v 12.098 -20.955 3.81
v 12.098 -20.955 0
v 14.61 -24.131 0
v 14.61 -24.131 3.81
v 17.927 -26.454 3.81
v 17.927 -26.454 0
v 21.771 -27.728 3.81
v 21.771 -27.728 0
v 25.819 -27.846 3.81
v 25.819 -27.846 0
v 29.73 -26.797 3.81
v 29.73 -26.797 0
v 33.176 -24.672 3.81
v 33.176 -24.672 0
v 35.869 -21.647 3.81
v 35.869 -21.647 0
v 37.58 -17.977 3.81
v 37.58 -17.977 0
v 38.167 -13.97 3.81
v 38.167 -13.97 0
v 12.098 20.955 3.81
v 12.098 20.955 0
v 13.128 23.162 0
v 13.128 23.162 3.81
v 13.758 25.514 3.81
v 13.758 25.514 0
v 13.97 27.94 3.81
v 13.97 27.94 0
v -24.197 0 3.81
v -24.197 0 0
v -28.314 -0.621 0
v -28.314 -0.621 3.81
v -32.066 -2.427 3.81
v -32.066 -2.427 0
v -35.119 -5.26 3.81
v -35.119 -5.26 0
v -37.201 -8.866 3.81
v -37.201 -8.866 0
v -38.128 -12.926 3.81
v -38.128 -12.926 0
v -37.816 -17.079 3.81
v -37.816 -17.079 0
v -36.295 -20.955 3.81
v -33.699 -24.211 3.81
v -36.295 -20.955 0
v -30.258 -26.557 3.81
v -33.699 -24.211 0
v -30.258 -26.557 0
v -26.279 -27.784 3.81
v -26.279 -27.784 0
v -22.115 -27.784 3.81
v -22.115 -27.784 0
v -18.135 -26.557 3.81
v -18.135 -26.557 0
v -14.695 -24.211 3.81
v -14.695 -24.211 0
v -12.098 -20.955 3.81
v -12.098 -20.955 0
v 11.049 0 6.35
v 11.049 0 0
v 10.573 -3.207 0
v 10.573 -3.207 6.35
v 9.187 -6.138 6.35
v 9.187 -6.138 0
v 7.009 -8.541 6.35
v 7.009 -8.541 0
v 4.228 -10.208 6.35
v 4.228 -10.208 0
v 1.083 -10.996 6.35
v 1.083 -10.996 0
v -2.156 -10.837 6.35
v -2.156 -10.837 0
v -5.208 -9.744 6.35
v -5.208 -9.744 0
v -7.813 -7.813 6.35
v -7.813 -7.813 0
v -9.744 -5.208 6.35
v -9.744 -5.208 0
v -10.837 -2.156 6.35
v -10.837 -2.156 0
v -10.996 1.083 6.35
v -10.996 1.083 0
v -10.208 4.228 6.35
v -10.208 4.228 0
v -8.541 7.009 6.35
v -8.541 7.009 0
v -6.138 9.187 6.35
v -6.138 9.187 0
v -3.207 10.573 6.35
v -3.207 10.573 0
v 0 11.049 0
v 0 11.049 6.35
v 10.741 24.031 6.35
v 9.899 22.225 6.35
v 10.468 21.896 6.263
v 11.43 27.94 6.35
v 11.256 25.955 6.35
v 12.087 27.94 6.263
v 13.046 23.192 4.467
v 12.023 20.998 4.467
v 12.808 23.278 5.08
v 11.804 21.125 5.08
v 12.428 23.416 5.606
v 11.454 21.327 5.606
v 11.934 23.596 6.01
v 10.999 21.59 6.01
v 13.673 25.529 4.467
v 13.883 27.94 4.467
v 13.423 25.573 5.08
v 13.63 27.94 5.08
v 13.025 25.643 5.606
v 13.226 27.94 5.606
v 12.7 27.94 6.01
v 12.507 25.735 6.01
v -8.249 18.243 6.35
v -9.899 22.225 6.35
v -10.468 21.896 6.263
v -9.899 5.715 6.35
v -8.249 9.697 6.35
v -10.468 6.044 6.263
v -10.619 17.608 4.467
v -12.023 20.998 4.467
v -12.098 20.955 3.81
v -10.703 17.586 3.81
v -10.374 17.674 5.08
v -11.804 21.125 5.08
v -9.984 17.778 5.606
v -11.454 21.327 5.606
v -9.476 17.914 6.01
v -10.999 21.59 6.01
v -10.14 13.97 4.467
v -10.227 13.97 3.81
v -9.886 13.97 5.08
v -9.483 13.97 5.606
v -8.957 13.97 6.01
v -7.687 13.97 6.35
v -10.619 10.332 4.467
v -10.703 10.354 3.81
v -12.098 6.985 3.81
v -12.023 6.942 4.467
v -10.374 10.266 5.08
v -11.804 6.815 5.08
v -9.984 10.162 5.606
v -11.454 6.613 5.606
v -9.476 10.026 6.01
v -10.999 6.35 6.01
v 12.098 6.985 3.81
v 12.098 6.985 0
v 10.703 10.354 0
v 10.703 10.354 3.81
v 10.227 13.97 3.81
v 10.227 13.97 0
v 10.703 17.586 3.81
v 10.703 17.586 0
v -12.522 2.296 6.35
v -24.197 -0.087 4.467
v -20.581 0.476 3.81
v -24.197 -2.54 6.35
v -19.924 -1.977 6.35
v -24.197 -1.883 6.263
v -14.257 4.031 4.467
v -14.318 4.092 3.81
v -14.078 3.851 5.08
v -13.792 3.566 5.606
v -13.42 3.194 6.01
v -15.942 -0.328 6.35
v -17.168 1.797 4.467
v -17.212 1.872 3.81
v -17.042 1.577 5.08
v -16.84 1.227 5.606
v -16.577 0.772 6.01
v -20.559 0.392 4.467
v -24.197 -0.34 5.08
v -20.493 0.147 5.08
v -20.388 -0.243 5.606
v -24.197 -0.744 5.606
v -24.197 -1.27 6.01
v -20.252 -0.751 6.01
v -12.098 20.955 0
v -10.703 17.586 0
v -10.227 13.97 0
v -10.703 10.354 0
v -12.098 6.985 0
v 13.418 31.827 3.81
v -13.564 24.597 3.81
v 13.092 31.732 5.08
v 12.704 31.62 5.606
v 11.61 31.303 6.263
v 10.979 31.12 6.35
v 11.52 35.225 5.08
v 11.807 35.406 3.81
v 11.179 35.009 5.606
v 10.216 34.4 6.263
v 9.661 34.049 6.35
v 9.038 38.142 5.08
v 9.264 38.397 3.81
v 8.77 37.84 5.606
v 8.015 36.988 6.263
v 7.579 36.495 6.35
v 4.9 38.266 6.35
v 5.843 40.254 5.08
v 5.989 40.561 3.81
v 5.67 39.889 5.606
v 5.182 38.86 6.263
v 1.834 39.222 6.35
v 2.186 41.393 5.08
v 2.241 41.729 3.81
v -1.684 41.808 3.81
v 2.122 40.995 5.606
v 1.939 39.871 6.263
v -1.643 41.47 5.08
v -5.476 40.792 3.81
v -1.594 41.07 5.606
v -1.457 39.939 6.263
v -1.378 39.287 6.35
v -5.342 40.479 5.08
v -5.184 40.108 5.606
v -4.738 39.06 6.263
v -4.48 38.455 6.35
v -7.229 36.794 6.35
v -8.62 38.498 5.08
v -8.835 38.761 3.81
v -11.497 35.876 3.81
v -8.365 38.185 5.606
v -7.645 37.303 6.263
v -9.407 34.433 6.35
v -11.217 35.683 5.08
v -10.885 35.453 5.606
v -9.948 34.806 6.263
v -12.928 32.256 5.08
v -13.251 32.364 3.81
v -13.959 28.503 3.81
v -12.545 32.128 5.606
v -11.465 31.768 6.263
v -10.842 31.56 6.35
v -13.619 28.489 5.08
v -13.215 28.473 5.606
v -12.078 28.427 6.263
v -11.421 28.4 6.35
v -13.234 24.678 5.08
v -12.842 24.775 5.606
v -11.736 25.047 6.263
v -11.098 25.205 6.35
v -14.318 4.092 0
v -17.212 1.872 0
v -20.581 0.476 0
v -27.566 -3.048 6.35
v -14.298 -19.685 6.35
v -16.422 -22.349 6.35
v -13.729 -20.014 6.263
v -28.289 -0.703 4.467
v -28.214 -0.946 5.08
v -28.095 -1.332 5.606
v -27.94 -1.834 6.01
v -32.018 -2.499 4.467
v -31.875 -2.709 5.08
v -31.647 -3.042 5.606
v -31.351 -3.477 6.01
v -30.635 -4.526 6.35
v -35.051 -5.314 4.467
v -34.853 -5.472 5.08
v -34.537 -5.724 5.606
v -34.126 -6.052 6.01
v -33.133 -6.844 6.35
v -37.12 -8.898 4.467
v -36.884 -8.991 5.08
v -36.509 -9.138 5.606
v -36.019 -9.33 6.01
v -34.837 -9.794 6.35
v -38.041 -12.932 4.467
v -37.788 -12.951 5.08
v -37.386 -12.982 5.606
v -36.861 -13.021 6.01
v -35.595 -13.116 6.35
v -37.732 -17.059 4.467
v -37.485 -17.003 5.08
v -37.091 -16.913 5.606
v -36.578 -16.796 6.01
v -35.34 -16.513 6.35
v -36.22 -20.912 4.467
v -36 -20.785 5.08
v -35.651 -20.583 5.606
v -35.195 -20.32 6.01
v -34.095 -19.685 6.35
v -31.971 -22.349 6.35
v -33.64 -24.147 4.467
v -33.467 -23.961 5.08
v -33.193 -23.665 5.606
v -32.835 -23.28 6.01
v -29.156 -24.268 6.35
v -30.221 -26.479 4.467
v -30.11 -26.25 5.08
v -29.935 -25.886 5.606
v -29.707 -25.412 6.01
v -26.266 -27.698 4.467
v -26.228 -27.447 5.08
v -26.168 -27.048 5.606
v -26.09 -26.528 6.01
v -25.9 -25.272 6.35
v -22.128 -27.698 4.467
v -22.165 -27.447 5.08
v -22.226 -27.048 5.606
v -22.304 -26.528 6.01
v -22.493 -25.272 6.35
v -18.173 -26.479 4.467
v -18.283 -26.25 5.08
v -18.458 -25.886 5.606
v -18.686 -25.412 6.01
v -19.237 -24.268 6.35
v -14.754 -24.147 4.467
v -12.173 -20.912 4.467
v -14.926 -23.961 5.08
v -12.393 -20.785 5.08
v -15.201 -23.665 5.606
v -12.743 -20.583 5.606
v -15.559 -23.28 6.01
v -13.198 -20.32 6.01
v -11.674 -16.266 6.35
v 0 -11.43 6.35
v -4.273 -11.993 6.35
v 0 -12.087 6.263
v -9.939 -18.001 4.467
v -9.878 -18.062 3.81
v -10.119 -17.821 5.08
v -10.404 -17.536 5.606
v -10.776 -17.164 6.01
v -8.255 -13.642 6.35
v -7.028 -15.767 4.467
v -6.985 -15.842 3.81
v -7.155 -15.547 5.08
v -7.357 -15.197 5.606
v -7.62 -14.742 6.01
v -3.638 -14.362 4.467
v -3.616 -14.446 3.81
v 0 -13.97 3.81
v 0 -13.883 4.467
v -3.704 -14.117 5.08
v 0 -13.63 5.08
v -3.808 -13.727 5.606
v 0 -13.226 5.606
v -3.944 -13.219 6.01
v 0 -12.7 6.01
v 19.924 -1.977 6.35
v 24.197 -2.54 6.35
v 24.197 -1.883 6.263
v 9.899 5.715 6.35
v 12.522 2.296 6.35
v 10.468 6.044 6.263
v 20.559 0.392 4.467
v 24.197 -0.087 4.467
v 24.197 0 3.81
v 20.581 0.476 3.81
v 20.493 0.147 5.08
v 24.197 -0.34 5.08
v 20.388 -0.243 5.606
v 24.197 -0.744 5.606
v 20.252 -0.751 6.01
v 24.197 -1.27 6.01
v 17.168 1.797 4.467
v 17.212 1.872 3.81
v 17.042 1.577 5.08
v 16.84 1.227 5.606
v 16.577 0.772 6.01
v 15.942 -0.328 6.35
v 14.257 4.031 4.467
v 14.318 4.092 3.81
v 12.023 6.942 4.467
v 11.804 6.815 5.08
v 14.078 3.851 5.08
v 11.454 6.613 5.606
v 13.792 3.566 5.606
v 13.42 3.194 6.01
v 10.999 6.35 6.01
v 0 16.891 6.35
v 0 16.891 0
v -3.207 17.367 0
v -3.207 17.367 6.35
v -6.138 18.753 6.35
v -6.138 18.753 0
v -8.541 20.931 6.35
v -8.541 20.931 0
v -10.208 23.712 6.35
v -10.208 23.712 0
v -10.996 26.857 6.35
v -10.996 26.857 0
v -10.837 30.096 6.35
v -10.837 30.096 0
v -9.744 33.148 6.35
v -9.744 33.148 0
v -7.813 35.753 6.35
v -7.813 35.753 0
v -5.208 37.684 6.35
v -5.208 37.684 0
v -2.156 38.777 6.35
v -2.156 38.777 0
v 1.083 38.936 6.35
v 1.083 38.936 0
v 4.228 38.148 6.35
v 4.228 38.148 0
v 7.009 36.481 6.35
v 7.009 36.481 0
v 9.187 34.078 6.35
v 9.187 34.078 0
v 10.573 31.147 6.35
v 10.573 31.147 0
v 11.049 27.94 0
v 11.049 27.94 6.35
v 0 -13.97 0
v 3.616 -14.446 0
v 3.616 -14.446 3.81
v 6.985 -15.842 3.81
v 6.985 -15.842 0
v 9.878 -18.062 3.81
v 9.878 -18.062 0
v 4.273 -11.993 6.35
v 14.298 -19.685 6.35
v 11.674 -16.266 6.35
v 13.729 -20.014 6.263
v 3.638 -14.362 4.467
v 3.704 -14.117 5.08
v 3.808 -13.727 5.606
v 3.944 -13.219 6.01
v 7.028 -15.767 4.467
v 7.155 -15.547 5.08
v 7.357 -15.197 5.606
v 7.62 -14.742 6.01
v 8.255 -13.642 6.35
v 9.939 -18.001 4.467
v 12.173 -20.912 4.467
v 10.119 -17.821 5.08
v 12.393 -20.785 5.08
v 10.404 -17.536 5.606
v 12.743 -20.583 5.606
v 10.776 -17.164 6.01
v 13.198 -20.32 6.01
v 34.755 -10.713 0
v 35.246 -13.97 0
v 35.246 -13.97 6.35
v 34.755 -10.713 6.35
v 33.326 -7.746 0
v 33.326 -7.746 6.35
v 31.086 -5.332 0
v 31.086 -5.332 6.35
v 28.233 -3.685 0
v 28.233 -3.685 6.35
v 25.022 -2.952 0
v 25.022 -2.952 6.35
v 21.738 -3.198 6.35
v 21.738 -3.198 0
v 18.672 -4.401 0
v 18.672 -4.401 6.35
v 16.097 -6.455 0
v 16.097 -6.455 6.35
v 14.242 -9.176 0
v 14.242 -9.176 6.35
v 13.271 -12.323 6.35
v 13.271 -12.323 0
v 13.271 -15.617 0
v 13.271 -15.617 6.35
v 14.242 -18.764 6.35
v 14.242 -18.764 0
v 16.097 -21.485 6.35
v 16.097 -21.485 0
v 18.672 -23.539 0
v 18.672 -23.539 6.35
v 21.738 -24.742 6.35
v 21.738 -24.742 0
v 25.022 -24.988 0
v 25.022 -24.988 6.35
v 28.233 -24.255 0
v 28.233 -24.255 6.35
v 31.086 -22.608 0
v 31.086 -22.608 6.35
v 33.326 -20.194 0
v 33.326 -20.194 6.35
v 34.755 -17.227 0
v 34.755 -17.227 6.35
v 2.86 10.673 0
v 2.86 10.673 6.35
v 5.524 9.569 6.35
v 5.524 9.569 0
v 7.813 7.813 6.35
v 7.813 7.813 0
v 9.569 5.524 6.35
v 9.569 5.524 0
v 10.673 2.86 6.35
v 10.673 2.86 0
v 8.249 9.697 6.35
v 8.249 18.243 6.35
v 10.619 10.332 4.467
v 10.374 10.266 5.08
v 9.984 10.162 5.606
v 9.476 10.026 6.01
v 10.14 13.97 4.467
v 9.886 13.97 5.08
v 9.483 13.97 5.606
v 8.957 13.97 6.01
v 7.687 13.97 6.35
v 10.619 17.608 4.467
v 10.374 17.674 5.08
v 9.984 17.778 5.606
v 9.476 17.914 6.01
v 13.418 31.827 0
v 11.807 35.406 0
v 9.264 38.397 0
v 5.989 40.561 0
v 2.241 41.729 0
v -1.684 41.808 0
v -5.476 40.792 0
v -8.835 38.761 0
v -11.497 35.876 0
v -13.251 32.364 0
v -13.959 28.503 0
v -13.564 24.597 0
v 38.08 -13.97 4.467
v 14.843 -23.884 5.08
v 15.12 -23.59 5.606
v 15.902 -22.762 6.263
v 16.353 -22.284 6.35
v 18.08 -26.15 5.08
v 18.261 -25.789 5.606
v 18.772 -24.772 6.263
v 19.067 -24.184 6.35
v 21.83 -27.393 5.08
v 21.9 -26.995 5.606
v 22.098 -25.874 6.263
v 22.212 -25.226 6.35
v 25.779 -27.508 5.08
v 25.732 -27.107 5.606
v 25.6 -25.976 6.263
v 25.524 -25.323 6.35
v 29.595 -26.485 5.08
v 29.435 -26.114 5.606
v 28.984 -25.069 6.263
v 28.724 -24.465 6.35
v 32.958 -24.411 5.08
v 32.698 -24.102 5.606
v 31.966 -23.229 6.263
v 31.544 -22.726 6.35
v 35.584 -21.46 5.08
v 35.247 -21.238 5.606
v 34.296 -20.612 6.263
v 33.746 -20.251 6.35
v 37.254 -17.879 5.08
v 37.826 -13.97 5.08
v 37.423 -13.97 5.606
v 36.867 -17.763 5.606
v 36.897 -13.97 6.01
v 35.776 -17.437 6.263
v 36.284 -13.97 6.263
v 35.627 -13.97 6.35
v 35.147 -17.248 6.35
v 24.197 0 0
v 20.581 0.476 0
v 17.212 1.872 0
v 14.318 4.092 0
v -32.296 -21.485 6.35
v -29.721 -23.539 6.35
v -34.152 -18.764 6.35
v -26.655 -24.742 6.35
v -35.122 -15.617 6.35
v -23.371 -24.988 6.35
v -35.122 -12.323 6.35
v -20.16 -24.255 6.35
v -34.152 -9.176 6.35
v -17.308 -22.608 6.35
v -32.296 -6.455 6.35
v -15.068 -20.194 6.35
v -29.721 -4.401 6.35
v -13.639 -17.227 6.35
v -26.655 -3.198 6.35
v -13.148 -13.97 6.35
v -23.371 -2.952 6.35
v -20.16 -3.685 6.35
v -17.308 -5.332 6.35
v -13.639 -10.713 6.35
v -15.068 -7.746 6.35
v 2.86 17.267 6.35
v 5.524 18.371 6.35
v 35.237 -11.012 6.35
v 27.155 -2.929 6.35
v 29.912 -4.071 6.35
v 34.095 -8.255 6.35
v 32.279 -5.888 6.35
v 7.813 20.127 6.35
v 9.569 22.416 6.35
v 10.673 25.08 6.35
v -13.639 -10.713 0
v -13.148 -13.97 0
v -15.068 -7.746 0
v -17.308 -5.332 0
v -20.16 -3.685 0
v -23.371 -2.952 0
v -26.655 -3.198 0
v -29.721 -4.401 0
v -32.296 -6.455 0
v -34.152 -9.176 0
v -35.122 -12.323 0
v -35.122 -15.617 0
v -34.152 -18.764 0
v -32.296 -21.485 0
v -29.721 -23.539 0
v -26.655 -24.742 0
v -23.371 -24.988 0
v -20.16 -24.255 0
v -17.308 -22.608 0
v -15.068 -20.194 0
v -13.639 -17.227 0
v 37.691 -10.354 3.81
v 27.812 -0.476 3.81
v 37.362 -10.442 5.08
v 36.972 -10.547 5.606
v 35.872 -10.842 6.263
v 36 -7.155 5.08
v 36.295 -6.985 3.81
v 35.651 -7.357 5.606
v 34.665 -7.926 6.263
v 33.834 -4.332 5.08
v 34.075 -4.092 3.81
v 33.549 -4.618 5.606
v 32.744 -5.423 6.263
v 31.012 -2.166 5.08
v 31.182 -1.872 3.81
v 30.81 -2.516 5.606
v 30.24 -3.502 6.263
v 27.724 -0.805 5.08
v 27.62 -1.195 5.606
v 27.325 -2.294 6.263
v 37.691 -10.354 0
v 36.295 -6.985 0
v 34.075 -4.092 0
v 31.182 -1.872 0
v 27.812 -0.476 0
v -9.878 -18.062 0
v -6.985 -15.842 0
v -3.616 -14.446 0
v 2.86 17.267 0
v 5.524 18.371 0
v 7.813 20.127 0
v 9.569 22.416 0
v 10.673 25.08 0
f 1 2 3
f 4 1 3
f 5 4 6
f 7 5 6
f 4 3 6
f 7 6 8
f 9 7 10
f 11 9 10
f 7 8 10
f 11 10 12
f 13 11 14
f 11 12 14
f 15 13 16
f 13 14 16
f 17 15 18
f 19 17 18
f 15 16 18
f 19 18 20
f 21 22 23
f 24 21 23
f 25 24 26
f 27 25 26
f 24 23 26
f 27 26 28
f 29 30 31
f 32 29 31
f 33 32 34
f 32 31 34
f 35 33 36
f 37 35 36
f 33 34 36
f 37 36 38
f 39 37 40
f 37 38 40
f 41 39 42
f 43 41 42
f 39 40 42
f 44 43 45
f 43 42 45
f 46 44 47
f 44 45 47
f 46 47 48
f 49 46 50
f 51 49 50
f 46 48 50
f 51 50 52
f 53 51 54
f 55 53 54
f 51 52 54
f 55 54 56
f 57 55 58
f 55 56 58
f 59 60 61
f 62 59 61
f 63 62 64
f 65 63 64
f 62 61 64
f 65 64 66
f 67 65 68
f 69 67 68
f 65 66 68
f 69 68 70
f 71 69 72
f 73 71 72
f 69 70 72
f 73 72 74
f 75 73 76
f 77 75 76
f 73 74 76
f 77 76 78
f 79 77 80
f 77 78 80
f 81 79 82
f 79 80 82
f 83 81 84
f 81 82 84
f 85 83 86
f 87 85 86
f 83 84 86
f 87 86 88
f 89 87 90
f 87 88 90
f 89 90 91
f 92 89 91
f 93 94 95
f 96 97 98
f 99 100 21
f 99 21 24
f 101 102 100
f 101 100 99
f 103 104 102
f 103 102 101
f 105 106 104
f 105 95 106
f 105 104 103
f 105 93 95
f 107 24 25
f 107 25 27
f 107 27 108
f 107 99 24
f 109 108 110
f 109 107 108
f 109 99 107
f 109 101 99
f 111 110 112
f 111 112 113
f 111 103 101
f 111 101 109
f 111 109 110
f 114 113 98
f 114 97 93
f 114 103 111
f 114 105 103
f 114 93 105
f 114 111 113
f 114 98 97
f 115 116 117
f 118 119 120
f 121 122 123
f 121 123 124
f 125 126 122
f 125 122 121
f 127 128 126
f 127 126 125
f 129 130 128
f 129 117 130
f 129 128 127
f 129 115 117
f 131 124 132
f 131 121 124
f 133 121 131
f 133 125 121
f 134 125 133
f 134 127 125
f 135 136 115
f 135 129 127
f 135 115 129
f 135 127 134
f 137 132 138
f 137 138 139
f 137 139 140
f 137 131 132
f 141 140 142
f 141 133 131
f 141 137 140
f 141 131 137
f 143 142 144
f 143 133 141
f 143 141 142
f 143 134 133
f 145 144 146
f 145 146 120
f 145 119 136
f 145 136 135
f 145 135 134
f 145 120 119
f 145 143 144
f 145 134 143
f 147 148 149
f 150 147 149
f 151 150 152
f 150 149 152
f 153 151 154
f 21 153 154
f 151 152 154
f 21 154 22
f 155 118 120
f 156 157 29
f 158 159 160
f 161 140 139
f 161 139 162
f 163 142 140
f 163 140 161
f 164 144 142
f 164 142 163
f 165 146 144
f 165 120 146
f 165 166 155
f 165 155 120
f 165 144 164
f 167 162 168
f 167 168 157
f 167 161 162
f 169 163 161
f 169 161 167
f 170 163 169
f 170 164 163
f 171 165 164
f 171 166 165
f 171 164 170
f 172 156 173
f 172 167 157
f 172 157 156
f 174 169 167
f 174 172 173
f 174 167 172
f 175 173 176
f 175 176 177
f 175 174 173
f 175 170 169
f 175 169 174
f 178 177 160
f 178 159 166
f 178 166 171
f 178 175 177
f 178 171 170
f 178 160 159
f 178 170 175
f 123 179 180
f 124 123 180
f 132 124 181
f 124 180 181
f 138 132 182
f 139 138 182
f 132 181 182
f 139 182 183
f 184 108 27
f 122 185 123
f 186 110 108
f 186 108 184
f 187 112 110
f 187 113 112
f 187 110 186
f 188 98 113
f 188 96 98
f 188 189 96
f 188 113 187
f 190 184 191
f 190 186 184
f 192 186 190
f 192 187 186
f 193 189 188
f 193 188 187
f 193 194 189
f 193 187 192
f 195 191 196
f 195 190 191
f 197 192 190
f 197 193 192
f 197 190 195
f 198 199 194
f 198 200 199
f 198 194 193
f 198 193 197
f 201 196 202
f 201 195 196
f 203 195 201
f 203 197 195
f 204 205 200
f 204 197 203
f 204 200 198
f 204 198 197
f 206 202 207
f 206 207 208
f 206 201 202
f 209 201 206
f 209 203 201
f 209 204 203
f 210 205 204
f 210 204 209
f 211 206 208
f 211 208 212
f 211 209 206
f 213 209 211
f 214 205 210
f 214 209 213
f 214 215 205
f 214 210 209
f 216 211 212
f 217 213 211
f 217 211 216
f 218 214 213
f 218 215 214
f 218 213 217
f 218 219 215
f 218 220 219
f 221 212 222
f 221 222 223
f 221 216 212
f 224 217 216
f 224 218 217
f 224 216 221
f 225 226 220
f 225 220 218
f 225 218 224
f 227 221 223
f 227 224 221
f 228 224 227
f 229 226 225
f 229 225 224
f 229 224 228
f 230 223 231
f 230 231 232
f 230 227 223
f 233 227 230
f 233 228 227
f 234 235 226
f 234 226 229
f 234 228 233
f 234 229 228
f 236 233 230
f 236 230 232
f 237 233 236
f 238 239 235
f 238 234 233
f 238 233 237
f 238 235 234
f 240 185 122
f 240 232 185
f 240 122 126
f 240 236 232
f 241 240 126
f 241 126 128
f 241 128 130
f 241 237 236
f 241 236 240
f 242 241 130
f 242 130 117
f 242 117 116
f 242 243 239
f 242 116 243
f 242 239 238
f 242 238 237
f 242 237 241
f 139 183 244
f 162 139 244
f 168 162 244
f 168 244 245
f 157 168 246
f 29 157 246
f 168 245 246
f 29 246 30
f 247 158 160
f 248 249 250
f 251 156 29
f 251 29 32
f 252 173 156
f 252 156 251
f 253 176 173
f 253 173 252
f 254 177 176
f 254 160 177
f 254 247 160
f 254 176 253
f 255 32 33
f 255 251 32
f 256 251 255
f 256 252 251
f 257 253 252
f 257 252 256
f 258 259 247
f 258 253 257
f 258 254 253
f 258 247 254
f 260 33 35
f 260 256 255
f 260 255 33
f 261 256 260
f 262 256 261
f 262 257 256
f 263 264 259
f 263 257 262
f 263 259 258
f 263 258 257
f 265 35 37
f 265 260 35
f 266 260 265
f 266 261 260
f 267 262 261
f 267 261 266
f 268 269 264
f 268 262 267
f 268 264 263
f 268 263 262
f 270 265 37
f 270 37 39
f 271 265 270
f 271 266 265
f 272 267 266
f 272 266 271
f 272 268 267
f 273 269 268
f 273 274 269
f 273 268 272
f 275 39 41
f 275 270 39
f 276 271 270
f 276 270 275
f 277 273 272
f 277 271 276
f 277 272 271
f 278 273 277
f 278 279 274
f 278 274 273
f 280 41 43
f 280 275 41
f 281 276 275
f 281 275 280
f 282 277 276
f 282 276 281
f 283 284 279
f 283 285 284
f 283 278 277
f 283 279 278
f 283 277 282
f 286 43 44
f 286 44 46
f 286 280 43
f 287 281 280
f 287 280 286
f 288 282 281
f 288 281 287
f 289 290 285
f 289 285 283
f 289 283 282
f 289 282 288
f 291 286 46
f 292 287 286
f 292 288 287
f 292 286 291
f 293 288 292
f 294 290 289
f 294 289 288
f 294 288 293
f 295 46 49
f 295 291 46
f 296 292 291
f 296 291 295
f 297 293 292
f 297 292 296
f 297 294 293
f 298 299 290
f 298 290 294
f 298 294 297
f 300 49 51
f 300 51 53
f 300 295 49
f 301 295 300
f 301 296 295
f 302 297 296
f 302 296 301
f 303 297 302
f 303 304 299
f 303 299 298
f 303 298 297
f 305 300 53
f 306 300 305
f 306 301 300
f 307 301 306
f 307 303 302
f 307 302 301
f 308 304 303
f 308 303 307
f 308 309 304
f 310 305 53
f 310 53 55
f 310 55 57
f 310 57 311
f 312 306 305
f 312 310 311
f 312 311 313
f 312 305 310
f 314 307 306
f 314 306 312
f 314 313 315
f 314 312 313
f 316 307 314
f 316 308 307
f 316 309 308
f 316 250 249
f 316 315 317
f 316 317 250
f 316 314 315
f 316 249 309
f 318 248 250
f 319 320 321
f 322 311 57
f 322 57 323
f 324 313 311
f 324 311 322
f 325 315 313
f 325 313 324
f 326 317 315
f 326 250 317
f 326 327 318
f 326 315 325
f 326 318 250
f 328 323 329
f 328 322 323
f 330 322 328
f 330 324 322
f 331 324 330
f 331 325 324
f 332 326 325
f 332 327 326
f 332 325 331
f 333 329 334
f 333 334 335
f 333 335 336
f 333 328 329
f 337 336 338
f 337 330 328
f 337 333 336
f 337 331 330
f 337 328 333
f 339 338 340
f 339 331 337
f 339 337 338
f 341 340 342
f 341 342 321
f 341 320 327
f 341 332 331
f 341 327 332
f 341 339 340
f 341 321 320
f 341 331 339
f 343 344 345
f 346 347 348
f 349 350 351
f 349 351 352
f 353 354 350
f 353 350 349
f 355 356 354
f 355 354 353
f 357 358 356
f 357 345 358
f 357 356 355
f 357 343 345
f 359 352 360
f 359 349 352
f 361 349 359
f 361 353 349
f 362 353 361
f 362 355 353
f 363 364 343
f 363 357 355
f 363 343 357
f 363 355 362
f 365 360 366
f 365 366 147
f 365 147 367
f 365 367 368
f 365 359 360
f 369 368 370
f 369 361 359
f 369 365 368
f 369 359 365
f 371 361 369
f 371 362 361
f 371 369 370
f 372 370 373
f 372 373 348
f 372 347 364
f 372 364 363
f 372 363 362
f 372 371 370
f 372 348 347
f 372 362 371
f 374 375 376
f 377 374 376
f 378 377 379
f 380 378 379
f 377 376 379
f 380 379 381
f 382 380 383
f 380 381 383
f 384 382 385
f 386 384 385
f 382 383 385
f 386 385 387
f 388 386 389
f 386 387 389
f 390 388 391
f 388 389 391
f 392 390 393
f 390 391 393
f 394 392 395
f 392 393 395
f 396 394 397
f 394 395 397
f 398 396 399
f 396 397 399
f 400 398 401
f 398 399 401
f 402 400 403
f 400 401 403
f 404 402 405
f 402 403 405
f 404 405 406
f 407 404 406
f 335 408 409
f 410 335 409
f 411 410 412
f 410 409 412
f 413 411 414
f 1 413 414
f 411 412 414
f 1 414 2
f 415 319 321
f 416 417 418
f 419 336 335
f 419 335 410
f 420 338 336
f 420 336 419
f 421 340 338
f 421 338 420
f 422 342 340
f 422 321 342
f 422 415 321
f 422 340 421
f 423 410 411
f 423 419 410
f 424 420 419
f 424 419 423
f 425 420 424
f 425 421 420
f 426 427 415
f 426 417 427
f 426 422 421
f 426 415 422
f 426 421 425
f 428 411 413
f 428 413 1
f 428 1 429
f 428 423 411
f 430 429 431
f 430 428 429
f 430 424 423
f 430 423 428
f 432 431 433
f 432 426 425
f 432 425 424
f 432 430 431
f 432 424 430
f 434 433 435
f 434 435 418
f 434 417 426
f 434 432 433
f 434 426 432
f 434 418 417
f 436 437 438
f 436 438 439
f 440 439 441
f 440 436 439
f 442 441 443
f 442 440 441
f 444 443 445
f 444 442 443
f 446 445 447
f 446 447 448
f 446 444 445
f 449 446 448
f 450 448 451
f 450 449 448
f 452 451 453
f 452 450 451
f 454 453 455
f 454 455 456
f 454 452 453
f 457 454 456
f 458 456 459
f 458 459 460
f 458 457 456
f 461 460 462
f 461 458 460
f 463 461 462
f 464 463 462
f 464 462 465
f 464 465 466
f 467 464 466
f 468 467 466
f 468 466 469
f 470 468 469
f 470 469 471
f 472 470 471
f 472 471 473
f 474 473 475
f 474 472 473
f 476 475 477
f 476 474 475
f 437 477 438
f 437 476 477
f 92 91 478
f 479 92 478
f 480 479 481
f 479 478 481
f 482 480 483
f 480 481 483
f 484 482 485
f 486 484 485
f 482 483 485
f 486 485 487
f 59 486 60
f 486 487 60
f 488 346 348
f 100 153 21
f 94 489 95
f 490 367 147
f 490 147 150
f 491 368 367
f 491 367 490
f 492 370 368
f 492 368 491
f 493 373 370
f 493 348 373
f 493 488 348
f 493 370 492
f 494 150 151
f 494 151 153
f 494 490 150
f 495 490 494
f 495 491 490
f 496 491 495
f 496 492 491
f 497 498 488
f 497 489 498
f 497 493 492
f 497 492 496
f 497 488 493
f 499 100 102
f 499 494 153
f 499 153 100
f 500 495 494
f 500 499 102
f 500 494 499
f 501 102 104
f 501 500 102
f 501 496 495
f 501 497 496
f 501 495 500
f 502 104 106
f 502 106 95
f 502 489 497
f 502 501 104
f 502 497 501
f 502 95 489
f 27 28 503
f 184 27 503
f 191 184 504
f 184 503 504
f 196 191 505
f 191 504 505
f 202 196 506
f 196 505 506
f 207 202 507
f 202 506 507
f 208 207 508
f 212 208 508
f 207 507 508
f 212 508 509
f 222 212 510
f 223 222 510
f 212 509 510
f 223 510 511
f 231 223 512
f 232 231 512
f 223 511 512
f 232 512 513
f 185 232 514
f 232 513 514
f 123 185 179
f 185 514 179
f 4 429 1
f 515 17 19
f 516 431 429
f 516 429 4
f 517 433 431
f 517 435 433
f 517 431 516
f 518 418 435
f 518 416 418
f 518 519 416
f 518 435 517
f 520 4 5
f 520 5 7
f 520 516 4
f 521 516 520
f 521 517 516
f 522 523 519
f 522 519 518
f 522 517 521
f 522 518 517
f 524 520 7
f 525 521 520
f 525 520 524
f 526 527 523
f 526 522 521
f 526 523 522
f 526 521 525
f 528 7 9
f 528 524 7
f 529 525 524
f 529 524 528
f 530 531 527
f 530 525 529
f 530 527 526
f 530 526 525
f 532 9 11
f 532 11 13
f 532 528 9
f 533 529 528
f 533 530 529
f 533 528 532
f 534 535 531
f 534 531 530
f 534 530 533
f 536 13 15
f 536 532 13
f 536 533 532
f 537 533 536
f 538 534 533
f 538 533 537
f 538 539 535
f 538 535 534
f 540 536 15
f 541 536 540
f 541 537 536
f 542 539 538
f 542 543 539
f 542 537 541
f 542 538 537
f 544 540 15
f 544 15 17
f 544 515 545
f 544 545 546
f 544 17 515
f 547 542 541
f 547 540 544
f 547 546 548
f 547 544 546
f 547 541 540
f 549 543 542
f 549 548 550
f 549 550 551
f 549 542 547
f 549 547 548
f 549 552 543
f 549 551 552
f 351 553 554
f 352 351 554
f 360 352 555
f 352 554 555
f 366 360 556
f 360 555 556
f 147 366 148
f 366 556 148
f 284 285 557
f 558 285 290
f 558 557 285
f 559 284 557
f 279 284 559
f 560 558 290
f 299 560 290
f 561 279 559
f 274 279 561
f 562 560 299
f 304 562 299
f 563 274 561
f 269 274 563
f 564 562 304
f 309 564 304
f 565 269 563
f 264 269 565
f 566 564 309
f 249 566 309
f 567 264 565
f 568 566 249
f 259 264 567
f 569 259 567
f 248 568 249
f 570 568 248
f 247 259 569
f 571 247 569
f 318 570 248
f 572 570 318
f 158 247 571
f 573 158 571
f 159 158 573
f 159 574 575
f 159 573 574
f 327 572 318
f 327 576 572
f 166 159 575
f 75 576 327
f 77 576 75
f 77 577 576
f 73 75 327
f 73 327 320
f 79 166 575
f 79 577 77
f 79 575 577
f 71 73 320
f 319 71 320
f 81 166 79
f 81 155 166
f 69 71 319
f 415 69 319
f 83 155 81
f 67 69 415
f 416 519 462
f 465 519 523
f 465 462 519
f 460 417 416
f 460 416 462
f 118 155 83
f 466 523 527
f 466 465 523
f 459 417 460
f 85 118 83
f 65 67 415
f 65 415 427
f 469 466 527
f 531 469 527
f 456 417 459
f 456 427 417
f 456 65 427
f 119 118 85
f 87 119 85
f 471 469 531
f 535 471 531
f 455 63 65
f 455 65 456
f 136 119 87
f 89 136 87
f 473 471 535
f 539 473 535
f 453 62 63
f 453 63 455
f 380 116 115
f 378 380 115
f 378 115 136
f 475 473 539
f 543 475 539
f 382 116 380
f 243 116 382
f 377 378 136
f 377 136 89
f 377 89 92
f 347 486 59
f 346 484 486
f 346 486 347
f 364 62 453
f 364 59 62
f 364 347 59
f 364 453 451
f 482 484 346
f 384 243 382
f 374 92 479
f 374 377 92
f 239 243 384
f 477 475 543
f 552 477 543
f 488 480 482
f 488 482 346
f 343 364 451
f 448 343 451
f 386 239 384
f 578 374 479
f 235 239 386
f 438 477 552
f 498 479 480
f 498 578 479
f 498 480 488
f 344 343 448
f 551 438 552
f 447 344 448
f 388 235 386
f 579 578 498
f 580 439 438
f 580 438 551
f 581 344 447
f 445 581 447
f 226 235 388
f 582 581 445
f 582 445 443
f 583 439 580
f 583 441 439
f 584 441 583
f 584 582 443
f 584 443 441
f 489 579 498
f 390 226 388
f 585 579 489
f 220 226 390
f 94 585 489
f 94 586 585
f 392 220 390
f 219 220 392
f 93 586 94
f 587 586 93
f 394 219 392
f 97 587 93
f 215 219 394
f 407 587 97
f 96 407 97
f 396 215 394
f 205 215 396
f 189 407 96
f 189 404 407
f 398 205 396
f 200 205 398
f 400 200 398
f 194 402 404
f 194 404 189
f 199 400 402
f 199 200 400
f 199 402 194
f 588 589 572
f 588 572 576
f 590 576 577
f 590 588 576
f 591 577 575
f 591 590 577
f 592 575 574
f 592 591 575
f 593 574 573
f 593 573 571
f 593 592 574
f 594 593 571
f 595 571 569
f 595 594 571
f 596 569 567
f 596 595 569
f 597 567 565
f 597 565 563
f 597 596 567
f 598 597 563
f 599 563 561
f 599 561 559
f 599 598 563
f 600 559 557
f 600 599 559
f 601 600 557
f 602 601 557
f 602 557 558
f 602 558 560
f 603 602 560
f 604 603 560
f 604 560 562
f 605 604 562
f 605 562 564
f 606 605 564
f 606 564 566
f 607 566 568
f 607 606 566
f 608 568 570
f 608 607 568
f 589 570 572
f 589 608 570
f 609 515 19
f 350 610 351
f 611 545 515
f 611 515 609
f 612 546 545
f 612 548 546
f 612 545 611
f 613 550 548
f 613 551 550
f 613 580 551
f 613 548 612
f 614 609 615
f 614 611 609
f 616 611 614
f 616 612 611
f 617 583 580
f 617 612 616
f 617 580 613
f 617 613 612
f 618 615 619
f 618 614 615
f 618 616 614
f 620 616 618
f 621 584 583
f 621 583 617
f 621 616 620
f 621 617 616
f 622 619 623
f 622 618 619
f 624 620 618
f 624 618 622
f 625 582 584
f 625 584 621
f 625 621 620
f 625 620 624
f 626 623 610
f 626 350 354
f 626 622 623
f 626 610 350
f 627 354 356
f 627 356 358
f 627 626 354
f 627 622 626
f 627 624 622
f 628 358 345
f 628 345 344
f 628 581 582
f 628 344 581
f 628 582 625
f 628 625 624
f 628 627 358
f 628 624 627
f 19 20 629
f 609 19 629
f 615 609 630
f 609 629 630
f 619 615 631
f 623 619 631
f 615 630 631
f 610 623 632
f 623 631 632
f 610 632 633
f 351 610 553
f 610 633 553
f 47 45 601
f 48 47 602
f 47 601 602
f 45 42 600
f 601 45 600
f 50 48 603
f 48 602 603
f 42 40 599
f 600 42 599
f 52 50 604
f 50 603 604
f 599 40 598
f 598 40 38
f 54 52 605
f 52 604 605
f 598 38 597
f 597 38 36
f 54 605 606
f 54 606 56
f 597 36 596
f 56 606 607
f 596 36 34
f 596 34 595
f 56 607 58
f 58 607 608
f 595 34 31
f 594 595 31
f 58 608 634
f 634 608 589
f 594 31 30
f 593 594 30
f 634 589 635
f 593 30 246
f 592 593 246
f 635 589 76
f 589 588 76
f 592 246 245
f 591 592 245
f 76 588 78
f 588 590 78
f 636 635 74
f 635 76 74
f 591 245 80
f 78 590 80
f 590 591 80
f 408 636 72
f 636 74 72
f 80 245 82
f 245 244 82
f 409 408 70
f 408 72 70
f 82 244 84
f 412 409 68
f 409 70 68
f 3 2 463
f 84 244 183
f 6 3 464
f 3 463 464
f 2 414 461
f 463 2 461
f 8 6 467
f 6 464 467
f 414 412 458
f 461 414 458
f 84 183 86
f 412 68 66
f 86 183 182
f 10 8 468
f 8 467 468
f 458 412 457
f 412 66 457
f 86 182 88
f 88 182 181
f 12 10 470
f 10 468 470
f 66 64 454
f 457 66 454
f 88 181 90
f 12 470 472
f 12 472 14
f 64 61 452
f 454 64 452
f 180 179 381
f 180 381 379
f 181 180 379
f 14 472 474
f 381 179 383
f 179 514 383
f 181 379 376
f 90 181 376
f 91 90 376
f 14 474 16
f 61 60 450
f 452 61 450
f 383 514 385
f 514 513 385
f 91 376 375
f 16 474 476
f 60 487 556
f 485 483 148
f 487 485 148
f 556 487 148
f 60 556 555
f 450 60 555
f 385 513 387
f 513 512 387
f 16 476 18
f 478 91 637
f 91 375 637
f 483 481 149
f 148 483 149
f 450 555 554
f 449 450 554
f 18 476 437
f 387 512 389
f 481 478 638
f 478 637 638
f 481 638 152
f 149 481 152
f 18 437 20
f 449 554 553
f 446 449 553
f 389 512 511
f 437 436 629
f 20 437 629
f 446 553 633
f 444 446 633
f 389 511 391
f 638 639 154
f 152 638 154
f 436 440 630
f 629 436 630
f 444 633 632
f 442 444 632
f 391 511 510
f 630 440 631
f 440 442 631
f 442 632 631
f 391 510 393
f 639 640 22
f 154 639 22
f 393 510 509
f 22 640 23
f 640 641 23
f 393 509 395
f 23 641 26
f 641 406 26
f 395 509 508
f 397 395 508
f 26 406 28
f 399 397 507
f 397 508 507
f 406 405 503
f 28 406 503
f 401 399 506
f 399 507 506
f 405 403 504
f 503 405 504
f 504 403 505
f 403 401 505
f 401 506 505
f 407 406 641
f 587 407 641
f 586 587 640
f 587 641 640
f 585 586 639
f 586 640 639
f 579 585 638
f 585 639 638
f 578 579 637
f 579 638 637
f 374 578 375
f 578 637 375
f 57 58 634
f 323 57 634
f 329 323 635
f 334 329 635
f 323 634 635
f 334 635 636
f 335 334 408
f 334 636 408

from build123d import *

# Parameters (mm, degrees)
F0_R     = 11.049
F1_DEPTH = 6.35
F2_R     = 2.54


# Not quite as in the source:
# - ends of sketch curves that miss each other by under 0.0002 mm in the source are joined


with BuildPart() as f1:
    # F0 (on Top) → F1 (new body)
    with BuildSketch(Plane.XY):
        with BuildLine():
            ThreePointArc((0, 11.049), (7.8128228253, 7.8128228253), (11.049, 0))
            ThreePointArc((11.049, 0), (-2.8596916293, -10.6725144547), (-9.5687146864, 5.5245))
            Line((-9.5687146864, 5.5245), (-12.0983748909, 6.985))
            ThreePointArc((-12.0983748909, 6.985), (-13.97, 3.443e-07), (-12.0983754224, -6.9849990793))
            ThreePointArc((-12.0983754224, -6.9849990793), (-6.9850004566, -12.0983746273), (8.7e-09, -13.97))
            ThreePointArc((8.7e-09, -13.97), (6.9850004798, -12.0983746139), (12.0983754405, -6.984999048))
            ThreePointArc((12.0983754405, -6.984999048), (13.4939839355, -3.6157015292), (13.97, 0))
            ThreePointArc((13.97, 0), (13.4939839355, 3.6157015292), (12.0983754405, 6.984999048))
            ThreePointArc((12.0983754405, 6.984999048), (6.9850004648, 12.0983746225), (-2.58e-08, 13.97))
            Line((-2.58e-08, 13.97), (0, 11.049))
        make_face()
        with BuildLine():
            ThreePointArc((-9.5687146864, 5.5245), (-5.5245, 9.5687146864), (0, 11.049))
            Line((0, 11.049), (0, 13.97))
            ThreePointArc((0, 13.97), (-6.9850001734, 12.0983747908), (-12.0983750781, 6.9849996757))
            Line((-12.0983750781, 6.9849996757), (-9.5687146864, 5.5245))
        make_face()
        with BuildLine():
            ThreePointArc((-12.0983750781, 6.9849996757), (-6.9850001734, 12.0983747908), (-2.58e-08, 13.97))
            ThreePointArc((-2.58e-08, 13.97), (-6.9850000112, 15.8416251156), (-12.0983748909, 20.955))
            ThreePointArc((-12.0983748909, 20.955), (-10.2267497817, 13.9699998127), (-12.0983750781, 6.9849996757))
        make_face()
        with BuildLine():
            ThreePointArc((-12.0983748909, 20.955), (-6.9850000112, 15.8416251156), (-2.58e-08, 13.97))
            ThreePointArc((-2.58e-08, 13.97), (6.9849999888, 15.8416251027), (12.0983748909, 20.955))
            ThreePointArc((12.0983748909, 20.955), (13.4939837933, 24.3242979399), (13.97, 27.94))
            ThreePointArc((13.97, 27.94), (-3.6157020601, 41.4339837933), (-12.0983748909, 20.955))
        make_face()
        with BuildLine():
            ThreePointArc((11.049, 27.94), (7.8128228253, 20.1271771747), (0, 16.891))
            ThreePointArc((0, 16.891), (-7.8128228253, 35.7528228253), (11.049, 27.94))
        make_face(mode=Mode.SUBTRACT)
        with BuildLine():
            ThreePointArc((12.0983748909, 20.955), (6.9849999888, 15.8416251027), (-2.58e-08, 13.97))
            ThreePointArc((-2.58e-08, 13.97), (6.9850004648, 12.0983746225), (12.0983754405, 6.984999048))
            ThreePointArc((12.0983754405, 6.984999048), (10.2267497817, 13.9699994504), (12.0983748909, 20.955))
        make_face()
        with BuildLine():
            ThreePointArc((-12.0983754224, -6.9849990793), (-13.97, 3.443e-07), (-12.0983750781, 6.9849996757))
            ThreePointArc((-12.0983750781, 6.9849996757), (-17.2117499439, 1.8716250155), (-24.1967497817, 0))
            ThreePointArc((-24.1967497817, 0), (-17.2117502421, -1.8716248433), (-12.0983754224, -6.9849990793))
        make_face()
        with BuildLine():
            ThreePointArc((24.1967497817, 0), (17.2117502577, 1.8716248343), (12.0983754405, 6.984999048))
            ThreePointArc((12.0983754405, 6.984999048), (13.4939839355, 3.6157015292), (13.97, 0))
            ThreePointArc((13.97, 0), (13.4939839355, -3.6157015292), (12.0983754405, -6.984999048))
            ThreePointArc((12.0983754405, -6.984999048), (17.2117502577, -1.8716248343), (24.1967497817, 0))
        make_face()
        with BuildLine():
            ThreePointArc((8.7e-09, -13.97), (-6.9850004566, -12.0983746273), (-12.0983754224, -6.9849990793))
            ThreePointArc((-12.0983754224, -6.9849990793), (-10.7027661261, -10.3542974265), (-10.2267497817, -13.97))
            ThreePointArc((-10.2267497817, -13.97), (-10.7027659885, -17.5857020601), (-12.0983748909, -20.955))
            ThreePointArc((-12.0983748909, -20.955), (-6.9849999962, -15.841625107), (8.7e-09, -13.97))
        make_face()
        with BuildLine():
            ThreePointArc((-10.2267497817, -13.97), (-10.7027661261, -10.3542974265), (-12.0983754224, -6.9849990793))
            ThreePointArc((-12.0983754224, -6.9849990793), (-17.2117502421, -1.8716248433), (-24.1967497817, 0))
            ThreePointArc((-24.1967497817, 0), (-36.2951246726, -20.955), (-12.0983748909, -20.955))
            ThreePointArc((-12.0983748909, -20.955), (-10.7027659885, -17.5857020601), (-10.2267497817, -13.97))
        make_face()
        with Locations((-24.1967497817, -13.97)):
            Circle(F0_R, mode=Mode.SUBTRACT)
        with BuildLine():
            ThreePointArc((38.1667497817, -13.97), (34.0750315149, -4.0917182668), (24.1967497817, 0))
            ThreePointArc((24.1967497817, 0), (17.2117502577, -1.8716248343), (12.0983754405, -6.984999048))
            ThreePointArc((12.0983754405, -6.984999048), (10.2267497817, -13.9699994504), (12.0983748909, -20.955))
            ThreePointArc((12.0983748909, -20.955), (27.8124518418, -27.4639837933), (38.1667497817, -13.97))
        make_face()
        with Locations((24.1967497817, -13.97)):
            Circle(F0_R, mode=Mode.SUBTRACT)
        with BuildLine():
            ThreePointArc((12.0983754405, -6.984999048), (6.9850004798, -12.0983746139), (8.7e-09, -13.97))
            ThreePointArc((8.7e-09, -13.97), (6.9850000038, -15.8416251113), (12.0983748909, -20.955))
            ThreePointArc((12.0983748909, -20.955), (10.2267497817, -13.9699994504), (12.0983754405, -6.984999048))
        make_face()
    extrude(amount=F1_DEPTH)

    # F2
    f2_edges = [f1.edges().sort_by_distance(p)[0] for p in [
        (0, -13.97, 6.35),
        (36.295125, -20.955, 6.35),
        (12.098375, 6.985, 6.35),
        (0, 41.91, 6.35),
        (-12.098375, 6.985, 6.35),
        (-36.295125, -20.955, 6.35),
    ]]
    fillet(f2_edges, radius=F2_R)


solid = f1.part
